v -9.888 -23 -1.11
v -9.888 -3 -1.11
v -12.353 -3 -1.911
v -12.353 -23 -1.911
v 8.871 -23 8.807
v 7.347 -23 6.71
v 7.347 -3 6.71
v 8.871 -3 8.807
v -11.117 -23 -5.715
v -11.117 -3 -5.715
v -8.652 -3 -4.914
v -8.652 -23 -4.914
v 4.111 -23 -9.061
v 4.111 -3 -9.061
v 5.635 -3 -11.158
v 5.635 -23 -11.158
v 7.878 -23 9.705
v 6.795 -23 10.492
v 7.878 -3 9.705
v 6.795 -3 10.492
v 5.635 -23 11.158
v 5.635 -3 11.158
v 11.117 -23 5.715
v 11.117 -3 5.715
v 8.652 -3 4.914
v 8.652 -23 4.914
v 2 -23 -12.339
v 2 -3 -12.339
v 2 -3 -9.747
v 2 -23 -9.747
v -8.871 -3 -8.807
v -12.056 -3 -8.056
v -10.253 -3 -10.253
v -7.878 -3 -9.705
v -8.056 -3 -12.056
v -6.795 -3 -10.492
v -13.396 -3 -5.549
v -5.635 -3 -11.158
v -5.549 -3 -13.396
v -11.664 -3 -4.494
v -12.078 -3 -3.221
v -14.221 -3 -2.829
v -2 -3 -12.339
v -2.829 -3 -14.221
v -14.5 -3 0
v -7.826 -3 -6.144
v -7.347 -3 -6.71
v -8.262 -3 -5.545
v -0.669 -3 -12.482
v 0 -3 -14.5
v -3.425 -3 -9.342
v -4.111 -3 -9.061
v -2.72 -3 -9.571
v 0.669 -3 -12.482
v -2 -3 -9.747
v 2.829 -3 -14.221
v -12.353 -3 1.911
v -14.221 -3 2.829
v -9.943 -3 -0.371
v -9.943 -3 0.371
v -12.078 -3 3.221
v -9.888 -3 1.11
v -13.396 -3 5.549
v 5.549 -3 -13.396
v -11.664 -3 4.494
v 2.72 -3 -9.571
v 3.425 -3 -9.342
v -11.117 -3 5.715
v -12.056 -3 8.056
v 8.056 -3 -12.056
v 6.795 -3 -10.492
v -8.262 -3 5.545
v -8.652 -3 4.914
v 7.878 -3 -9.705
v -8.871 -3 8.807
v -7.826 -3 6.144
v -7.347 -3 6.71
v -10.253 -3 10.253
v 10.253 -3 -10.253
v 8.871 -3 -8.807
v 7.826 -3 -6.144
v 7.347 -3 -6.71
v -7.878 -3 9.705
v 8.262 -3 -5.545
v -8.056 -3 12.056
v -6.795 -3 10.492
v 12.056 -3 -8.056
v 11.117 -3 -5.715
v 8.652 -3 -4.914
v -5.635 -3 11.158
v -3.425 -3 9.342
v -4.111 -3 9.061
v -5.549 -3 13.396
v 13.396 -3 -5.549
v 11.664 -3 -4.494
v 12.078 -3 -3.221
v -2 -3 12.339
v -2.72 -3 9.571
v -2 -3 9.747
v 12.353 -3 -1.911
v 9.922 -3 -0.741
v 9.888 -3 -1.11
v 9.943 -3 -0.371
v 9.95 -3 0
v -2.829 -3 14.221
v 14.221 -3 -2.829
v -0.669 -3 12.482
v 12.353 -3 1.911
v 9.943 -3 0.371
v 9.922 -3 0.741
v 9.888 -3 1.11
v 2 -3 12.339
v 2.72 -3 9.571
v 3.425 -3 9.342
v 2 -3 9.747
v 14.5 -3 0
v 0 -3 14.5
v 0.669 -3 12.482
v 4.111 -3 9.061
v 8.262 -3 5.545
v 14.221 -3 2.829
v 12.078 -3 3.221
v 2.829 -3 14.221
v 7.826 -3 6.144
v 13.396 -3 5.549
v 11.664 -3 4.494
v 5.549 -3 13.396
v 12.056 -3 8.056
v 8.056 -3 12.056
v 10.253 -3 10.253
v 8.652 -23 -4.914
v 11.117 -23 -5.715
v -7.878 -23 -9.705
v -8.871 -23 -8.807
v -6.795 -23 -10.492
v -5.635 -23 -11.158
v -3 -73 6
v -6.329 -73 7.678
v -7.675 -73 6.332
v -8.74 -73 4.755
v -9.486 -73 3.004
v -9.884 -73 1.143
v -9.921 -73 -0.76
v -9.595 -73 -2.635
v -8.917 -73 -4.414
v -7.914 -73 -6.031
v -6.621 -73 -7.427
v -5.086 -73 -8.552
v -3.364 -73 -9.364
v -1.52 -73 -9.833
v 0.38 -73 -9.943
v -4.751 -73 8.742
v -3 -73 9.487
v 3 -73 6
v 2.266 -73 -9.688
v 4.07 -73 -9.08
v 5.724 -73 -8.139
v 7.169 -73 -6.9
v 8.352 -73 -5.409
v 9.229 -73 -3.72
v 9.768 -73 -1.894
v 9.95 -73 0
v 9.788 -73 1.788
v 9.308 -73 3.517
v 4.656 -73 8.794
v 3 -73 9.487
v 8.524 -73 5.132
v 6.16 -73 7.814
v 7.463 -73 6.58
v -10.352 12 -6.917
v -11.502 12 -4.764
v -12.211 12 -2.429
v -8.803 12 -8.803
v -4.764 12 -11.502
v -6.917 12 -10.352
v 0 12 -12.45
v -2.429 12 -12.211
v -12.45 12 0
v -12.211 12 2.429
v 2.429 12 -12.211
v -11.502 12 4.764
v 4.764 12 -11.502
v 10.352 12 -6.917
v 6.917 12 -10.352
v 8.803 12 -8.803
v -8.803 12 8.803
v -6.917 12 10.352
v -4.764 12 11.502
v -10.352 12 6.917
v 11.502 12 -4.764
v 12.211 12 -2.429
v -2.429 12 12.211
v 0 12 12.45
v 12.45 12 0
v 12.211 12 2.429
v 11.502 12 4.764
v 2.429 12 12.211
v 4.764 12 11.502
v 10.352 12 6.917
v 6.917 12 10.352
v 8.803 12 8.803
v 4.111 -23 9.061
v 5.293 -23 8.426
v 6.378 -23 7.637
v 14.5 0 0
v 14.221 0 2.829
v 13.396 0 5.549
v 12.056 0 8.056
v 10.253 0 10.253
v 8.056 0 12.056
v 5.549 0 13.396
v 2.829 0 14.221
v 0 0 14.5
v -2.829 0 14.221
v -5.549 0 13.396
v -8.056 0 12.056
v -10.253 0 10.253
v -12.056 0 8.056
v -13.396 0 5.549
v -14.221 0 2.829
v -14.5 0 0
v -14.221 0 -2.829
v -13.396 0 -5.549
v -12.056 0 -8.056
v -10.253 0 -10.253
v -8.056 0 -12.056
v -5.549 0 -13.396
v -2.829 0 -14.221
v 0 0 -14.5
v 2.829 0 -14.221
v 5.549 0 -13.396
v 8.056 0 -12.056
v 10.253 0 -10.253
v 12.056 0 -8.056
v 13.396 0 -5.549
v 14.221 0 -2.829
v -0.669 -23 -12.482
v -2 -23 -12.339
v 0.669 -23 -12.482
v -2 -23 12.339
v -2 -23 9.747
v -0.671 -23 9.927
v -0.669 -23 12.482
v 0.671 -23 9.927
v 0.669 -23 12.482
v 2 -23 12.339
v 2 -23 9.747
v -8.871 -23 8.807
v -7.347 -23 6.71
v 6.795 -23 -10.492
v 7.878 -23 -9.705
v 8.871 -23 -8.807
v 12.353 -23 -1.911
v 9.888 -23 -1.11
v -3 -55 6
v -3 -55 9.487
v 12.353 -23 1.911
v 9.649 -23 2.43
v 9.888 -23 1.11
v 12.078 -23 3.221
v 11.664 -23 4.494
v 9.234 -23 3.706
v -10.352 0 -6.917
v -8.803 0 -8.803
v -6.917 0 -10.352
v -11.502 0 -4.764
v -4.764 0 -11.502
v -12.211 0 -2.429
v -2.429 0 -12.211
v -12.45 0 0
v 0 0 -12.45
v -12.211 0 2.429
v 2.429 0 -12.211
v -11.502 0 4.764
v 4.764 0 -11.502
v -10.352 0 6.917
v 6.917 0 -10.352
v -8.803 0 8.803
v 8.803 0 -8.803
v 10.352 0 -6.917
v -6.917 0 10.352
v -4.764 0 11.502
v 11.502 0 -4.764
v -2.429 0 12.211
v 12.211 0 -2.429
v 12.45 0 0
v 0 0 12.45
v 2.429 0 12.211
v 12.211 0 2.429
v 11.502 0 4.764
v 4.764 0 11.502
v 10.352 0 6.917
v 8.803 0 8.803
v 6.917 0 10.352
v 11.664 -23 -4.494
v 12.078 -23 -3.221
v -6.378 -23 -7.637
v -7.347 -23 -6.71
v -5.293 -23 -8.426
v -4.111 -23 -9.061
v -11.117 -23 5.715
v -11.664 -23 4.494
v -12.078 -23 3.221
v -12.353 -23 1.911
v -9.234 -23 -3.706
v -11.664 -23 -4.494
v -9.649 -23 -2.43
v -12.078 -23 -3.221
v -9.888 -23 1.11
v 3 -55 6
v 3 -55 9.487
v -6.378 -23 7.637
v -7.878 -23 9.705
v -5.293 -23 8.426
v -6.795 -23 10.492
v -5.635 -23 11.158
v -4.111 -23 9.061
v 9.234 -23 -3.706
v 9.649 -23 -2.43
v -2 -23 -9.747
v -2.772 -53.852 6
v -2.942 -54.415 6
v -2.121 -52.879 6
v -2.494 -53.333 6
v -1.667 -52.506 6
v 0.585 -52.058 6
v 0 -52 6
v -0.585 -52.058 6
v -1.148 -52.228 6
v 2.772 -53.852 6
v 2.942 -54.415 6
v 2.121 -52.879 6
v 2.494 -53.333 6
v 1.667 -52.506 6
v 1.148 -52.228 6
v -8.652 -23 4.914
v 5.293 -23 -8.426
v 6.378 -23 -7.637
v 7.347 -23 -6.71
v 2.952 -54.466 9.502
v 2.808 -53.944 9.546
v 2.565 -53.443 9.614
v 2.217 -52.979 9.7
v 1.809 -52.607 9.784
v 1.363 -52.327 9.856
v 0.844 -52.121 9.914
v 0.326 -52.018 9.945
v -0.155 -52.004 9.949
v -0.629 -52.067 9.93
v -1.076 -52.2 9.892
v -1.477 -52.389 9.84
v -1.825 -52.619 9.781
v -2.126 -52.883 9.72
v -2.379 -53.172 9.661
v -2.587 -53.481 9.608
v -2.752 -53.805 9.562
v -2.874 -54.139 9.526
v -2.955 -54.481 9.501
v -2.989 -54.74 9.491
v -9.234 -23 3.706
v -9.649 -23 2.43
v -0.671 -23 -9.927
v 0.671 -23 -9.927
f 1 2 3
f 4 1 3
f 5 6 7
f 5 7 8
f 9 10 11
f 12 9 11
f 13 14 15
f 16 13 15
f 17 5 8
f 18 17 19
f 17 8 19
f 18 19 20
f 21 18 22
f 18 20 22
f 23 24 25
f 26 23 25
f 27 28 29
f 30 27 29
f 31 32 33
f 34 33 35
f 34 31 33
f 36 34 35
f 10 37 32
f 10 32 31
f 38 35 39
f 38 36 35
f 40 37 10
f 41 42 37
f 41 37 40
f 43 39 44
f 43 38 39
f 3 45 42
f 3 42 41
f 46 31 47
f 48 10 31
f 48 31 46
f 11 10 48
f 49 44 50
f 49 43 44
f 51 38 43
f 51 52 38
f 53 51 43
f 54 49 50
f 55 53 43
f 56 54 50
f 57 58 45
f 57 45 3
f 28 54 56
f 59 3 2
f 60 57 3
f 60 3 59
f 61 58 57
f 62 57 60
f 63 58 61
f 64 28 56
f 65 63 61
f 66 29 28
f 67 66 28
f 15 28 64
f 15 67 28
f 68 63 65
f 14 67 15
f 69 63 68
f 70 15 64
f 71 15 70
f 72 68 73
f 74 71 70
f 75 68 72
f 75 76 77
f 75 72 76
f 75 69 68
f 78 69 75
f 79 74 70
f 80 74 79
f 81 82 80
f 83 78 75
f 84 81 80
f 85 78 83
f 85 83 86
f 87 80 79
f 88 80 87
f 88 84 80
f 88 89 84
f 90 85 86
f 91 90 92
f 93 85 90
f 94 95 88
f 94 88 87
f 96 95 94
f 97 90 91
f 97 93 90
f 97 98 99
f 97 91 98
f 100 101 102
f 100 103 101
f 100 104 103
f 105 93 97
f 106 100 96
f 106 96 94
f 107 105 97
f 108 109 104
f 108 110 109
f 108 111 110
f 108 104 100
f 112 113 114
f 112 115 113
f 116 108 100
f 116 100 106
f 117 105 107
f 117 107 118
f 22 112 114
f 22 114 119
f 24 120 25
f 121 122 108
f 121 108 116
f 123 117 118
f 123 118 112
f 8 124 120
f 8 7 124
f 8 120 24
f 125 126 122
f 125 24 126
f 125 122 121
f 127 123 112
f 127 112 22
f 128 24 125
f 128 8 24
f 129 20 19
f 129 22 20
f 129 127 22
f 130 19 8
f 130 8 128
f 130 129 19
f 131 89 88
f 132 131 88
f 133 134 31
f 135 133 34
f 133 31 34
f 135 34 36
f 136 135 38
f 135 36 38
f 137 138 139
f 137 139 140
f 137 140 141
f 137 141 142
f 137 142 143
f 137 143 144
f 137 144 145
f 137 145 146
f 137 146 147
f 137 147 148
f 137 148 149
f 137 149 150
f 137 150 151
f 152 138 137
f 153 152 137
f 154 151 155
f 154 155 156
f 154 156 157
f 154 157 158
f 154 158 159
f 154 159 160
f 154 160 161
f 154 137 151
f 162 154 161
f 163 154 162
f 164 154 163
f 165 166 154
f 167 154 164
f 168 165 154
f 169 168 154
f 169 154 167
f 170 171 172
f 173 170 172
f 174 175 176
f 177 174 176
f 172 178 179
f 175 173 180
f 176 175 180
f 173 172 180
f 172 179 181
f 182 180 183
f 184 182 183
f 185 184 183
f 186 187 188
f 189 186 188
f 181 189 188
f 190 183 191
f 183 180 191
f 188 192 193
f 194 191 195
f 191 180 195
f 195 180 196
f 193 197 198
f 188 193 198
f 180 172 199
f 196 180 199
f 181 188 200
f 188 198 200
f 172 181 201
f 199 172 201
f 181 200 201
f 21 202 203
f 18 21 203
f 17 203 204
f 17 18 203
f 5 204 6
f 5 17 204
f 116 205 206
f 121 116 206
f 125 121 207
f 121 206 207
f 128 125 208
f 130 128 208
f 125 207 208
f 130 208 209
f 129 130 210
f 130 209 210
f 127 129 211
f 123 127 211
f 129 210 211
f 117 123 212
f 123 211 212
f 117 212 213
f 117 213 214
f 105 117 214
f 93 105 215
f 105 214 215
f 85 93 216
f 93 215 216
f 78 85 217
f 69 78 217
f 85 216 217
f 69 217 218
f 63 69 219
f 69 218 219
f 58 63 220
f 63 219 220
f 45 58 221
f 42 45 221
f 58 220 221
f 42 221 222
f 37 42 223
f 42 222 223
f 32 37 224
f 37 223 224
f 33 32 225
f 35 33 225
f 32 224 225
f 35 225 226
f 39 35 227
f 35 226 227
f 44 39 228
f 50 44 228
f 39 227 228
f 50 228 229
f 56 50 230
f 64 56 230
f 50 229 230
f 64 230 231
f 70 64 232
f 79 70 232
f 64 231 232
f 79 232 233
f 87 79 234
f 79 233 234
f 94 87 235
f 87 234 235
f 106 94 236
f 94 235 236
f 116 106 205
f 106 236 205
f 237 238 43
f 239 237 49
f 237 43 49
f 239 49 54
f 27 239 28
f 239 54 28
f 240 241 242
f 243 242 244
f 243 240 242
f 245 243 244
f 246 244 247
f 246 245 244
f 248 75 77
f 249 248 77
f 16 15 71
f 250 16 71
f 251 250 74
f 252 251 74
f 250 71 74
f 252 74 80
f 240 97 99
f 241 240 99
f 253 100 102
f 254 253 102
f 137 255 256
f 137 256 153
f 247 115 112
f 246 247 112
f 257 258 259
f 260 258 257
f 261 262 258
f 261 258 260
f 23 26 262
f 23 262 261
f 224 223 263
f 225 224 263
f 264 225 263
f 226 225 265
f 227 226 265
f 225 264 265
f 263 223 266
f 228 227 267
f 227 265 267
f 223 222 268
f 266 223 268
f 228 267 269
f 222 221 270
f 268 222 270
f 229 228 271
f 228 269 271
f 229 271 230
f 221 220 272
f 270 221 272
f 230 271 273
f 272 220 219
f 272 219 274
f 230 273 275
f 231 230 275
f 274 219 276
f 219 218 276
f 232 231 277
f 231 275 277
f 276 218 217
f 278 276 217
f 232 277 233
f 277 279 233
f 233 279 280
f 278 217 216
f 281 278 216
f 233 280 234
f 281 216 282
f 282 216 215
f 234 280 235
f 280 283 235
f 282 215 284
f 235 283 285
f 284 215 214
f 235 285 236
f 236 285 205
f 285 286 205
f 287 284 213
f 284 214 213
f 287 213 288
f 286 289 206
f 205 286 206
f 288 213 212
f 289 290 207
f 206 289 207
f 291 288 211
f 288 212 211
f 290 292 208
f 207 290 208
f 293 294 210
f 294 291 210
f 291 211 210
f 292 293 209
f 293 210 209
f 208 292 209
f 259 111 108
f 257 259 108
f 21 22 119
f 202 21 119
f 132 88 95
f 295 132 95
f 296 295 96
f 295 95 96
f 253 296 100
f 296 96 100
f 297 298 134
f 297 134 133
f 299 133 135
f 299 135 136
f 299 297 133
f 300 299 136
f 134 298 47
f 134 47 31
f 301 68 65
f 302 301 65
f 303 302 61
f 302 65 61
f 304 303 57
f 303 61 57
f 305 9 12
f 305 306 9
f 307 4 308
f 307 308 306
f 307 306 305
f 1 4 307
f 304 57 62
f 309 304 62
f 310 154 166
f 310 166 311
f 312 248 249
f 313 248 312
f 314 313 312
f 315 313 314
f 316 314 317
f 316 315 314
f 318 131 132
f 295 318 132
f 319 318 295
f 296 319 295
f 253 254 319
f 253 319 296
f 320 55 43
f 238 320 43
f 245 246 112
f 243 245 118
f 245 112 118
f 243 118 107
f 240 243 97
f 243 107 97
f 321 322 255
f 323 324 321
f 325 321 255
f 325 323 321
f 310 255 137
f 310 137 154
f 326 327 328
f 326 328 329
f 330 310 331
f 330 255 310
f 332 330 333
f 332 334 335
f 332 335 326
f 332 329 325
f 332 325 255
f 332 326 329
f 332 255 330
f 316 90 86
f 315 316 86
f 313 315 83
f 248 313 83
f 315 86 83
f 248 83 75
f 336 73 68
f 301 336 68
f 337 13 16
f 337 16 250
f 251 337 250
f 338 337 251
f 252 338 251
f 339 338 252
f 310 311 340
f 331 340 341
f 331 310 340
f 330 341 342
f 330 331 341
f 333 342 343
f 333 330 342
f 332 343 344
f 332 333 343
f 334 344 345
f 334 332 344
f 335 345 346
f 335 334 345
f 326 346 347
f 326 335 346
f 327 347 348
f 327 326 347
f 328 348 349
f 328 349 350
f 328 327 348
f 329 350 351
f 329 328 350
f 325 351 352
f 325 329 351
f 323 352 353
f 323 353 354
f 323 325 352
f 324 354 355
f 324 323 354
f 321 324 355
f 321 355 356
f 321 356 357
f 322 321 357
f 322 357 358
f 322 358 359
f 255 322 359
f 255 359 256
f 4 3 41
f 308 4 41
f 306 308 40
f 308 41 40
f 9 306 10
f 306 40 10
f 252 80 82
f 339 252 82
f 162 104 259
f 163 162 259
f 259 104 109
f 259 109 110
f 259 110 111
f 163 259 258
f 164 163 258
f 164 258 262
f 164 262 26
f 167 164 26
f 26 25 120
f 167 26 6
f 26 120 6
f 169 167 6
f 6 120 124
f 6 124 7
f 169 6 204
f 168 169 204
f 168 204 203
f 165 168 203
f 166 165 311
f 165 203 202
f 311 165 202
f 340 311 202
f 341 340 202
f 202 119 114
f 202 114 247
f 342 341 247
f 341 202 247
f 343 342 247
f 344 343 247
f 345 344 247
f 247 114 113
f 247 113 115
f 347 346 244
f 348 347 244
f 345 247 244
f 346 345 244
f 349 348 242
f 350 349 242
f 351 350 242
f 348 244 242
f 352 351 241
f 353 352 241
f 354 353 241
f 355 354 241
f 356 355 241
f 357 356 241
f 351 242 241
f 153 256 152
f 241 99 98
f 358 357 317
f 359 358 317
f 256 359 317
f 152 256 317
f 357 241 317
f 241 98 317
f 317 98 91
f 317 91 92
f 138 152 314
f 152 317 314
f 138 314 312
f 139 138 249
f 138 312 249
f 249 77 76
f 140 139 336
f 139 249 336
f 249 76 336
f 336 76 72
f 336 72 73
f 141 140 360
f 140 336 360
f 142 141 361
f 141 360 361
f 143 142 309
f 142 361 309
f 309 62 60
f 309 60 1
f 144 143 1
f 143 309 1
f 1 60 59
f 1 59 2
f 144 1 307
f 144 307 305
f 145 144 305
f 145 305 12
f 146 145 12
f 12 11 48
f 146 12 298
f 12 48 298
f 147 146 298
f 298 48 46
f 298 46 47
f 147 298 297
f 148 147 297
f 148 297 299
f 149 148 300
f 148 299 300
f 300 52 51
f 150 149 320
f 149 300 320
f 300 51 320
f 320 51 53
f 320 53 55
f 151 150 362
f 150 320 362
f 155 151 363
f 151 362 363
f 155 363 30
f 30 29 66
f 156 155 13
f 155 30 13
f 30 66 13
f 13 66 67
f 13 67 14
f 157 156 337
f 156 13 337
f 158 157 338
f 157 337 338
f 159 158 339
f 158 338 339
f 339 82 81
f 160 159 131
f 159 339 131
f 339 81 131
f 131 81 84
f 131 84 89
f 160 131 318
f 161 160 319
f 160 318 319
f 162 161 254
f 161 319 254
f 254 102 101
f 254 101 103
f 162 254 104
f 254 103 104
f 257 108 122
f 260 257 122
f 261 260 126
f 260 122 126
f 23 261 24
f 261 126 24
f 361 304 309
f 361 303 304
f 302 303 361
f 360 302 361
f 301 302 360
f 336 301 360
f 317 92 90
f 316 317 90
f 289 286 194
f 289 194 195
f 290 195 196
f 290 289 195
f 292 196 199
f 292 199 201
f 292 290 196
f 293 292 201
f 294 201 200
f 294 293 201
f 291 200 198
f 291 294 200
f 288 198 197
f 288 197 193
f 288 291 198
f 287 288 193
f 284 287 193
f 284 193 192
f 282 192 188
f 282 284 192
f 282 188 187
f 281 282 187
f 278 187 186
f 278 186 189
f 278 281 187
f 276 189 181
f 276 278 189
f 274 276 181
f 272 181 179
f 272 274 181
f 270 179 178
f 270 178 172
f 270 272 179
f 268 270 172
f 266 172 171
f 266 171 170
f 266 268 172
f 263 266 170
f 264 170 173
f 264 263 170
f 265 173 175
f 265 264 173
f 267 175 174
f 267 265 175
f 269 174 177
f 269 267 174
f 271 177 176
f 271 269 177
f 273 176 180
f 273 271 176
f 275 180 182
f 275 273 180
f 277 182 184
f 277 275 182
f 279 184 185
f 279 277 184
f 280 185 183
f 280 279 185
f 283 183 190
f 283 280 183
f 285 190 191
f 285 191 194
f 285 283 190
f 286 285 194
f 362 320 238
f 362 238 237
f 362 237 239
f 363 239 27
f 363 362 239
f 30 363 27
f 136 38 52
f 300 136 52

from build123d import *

# Parameters (mm, degrees)
F0_R      = 12.45
F1_DEPTH  = 12
F2_R      = 14.5
F3_DEPTH  = 3
F4_R      = 9.95
F5_DEPTH  = 70
F8_DEPTH  = 12
F10_DEPTH = 20


with BuildPart() as f1:
    # F0 (on Front) → F1 (new body)
    with BuildSketch(Plane.XZ):
        Circle(F0_R)
    extrude(amount=-F1_DEPTH)

    # F2 (on Front) → F3 (join)
    with BuildSketch(Plane.XZ):
        Circle(F2_R)
    extrude(amount=F3_DEPTH)

    # F4 (on face) → F5 (join)
    with BuildSketch(Plane.XZ.offset(3)):
        Circle(F4_R)
    extrude(amount=F5_DEPTH)

    # F7 (on offset) → F8 (cut)
    with BuildSketch(Plane.XY.offset(6)):
        with BuildLine():
            Line((-3, -55), (-3, -107.7152226879))
            Line((-3, -107.7152226879), (3, -107.7152226879))
            Line((3, -107.7152226879), (3, -55))
            ThreePointArc((3, -55), (0, -52), (-3, -55))
        make_face()
    extrude(amount=F8_DEPTH, mode=Mode.SUBTRACT)

    # F9 (on face) → F10 (join)
    with BuildSketch(Plane.XZ.offset(3)):
        with BuildLine():
            Line((-8.8706942802, 8.8068599959), (-7.3471313431, 6.7098555146))
            ThreePointArc((-7.3471313431, 6.7098555146), (-5.8484632603, 8.049719094), (-4.1110633656, 9.0609965238))
            Line((-4.1110633656, 9.0609965238), (-5.6346263027, 11.1580010051))
            ThreePointArc((-5.6346263027, 11.1580010051), (-7.3473156537, 10.1127124297), (-8.8706942802, 8.8068599959))
        make_face()
        with BuildLine():
            Line((-2, 12.3389626793), (-2, 9.7469225913))
            ThreePointArc((-2, 9.7469225913), (0, 9.95), (2, 9.7469225913))
            Line((2, 9.7469225913), (2, 12.3389626793))
            ThreePointArc((2, 12.3389626793), (0, 12.5), (-2, 12.3389626793))
        make_face()
        with BuildLine():
            ThreePointArc((4.1110633656, 9.0609965238), (5.8484632603, 8.049719094), (7.3471313431, 6.7098555146))
            Line((7.3471313431, 6.7098555146), (8.8706942802, 8.8068599959))
            ThreePointArc((8.8706942802, 8.8068599959), (7.3473156537, 10.1127124297), (5.6346263027, 11.1580010051))
            Line((5.6346263027, 11.1580010051), (4.1110633656, 9.0609965238))
        make_face()
        with BuildLine():
            ThreePointArc((8.6518402555, 4.9140777561), (9.4630123371, 3.074719094), (9.887908233, 1.109851691))
            Line((9.887908233, 1.109851691), (12.3530848492, 1.9108361283))
            ThreePointArc((12.3530848492, 1.9108361283), (11.8882064537, 3.8627124297), (11.1170168717, 5.7150621934))
            Line((11.1170168717, 5.7150621934), (8.6518402555, 4.9140777561))
        make_face()
        with BuildLine():
            ThreePointArc((9.887908233, -1.109851691), (9.4630123371, -3.074719094), (8.6518402555, -4.9140777561))
            Line((8.6518402555, -4.9140777561), (11.1170168717, -5.7150621934))
            ThreePointArc((11.1170168717, -5.7150621934), (11.8882064537, -3.8627124297), (12.3530848492, -1.9108361283))
            Line((12.3530848492, -1.9108361283), (9.887908233, -1.109851691))
        make_face()
        with BuildLine():
            Line((-12.3530848492, 1.9108361283), (-9.887908233, 1.109851691))
            ThreePointArc((-9.887908233, 1.109851691), (-9.4630123371, 3.074719094), (-8.6518402555, 4.9140777561))
            Line((-8.6518402555, 4.9140777561), (-11.1170168717, 5.7150621934))
            ThreePointArc((-11.1170168717, 5.7150621934), (-11.8882064537, 3.8627124297), (-12.3530848492, 1.9108361283))
        make_face()
        with BuildLine():
            Line((-11.1170168717, -5.7150621934), (-8.6518402555, -4.9140777561))
            ThreePointArc((-8.6518402555, -4.9140777561), (-9.4630123371, -3.074719094), (-9.887908233, -1.109851691))
            Line((-9.887908233, -1.109851691), (-12.3530848492, -1.9108361283))
            ThreePointArc((-12.3530848492, -1.9108361283), (-11.8882064537, -3.8627124297), (-11.1170168717, -5.7150621934))
        make_face()
        with BuildLine():
            Line((-5.6346263027, -11.1580010051), (-4.1110633656, -9.0609965238))
            ThreePointArc((-4.1110633656, -9.0609965238), (-5.8484632603, -8.049719094), (-7.3471313431, -6.7098555146))
            Line((-7.3471313431, -6.7098555146), (-8.8706942802, -8.8068599959))
            ThreePointArc((-8.8706942802, -8.8068599959), (-7.3473156537, -10.1127124297), (-5.6346263027, -11.1580010051))
        make_face()
        with BuildLine():
            Line((-2, -9.7469225913), (-2, -12.3389626793))
            ThreePointArc((-2, -12.3389626793), (0, -12.5), (2, -12.3389626793))
            Line((2, -12.3389626793), (2, -9.7469225913))
            ThreePointArc((2, -9.7469225913), (0, -9.95), (-2, -9.7469225913))
        make_face()
        with BuildLine():
            ThreePointArc((7.3471313431, -6.7098555146), (5.8484632603, -8.049719094), (4.1110633656, -9.0609965238))
            Line((4.1110633656, -9.0609965238), (5.6346263027, -11.1580010051))
            ThreePointArc((5.6346263027, -11.1580010051), (7.3473156537, -10.1127124297), (8.8706942802, -8.8068599959))
            Line((8.8706942802, -8.8068599959), (7.3471313431, -6.7098555146))
        make_face()
    extrude(amount=F10_DEPTH)


solid = f1.part
